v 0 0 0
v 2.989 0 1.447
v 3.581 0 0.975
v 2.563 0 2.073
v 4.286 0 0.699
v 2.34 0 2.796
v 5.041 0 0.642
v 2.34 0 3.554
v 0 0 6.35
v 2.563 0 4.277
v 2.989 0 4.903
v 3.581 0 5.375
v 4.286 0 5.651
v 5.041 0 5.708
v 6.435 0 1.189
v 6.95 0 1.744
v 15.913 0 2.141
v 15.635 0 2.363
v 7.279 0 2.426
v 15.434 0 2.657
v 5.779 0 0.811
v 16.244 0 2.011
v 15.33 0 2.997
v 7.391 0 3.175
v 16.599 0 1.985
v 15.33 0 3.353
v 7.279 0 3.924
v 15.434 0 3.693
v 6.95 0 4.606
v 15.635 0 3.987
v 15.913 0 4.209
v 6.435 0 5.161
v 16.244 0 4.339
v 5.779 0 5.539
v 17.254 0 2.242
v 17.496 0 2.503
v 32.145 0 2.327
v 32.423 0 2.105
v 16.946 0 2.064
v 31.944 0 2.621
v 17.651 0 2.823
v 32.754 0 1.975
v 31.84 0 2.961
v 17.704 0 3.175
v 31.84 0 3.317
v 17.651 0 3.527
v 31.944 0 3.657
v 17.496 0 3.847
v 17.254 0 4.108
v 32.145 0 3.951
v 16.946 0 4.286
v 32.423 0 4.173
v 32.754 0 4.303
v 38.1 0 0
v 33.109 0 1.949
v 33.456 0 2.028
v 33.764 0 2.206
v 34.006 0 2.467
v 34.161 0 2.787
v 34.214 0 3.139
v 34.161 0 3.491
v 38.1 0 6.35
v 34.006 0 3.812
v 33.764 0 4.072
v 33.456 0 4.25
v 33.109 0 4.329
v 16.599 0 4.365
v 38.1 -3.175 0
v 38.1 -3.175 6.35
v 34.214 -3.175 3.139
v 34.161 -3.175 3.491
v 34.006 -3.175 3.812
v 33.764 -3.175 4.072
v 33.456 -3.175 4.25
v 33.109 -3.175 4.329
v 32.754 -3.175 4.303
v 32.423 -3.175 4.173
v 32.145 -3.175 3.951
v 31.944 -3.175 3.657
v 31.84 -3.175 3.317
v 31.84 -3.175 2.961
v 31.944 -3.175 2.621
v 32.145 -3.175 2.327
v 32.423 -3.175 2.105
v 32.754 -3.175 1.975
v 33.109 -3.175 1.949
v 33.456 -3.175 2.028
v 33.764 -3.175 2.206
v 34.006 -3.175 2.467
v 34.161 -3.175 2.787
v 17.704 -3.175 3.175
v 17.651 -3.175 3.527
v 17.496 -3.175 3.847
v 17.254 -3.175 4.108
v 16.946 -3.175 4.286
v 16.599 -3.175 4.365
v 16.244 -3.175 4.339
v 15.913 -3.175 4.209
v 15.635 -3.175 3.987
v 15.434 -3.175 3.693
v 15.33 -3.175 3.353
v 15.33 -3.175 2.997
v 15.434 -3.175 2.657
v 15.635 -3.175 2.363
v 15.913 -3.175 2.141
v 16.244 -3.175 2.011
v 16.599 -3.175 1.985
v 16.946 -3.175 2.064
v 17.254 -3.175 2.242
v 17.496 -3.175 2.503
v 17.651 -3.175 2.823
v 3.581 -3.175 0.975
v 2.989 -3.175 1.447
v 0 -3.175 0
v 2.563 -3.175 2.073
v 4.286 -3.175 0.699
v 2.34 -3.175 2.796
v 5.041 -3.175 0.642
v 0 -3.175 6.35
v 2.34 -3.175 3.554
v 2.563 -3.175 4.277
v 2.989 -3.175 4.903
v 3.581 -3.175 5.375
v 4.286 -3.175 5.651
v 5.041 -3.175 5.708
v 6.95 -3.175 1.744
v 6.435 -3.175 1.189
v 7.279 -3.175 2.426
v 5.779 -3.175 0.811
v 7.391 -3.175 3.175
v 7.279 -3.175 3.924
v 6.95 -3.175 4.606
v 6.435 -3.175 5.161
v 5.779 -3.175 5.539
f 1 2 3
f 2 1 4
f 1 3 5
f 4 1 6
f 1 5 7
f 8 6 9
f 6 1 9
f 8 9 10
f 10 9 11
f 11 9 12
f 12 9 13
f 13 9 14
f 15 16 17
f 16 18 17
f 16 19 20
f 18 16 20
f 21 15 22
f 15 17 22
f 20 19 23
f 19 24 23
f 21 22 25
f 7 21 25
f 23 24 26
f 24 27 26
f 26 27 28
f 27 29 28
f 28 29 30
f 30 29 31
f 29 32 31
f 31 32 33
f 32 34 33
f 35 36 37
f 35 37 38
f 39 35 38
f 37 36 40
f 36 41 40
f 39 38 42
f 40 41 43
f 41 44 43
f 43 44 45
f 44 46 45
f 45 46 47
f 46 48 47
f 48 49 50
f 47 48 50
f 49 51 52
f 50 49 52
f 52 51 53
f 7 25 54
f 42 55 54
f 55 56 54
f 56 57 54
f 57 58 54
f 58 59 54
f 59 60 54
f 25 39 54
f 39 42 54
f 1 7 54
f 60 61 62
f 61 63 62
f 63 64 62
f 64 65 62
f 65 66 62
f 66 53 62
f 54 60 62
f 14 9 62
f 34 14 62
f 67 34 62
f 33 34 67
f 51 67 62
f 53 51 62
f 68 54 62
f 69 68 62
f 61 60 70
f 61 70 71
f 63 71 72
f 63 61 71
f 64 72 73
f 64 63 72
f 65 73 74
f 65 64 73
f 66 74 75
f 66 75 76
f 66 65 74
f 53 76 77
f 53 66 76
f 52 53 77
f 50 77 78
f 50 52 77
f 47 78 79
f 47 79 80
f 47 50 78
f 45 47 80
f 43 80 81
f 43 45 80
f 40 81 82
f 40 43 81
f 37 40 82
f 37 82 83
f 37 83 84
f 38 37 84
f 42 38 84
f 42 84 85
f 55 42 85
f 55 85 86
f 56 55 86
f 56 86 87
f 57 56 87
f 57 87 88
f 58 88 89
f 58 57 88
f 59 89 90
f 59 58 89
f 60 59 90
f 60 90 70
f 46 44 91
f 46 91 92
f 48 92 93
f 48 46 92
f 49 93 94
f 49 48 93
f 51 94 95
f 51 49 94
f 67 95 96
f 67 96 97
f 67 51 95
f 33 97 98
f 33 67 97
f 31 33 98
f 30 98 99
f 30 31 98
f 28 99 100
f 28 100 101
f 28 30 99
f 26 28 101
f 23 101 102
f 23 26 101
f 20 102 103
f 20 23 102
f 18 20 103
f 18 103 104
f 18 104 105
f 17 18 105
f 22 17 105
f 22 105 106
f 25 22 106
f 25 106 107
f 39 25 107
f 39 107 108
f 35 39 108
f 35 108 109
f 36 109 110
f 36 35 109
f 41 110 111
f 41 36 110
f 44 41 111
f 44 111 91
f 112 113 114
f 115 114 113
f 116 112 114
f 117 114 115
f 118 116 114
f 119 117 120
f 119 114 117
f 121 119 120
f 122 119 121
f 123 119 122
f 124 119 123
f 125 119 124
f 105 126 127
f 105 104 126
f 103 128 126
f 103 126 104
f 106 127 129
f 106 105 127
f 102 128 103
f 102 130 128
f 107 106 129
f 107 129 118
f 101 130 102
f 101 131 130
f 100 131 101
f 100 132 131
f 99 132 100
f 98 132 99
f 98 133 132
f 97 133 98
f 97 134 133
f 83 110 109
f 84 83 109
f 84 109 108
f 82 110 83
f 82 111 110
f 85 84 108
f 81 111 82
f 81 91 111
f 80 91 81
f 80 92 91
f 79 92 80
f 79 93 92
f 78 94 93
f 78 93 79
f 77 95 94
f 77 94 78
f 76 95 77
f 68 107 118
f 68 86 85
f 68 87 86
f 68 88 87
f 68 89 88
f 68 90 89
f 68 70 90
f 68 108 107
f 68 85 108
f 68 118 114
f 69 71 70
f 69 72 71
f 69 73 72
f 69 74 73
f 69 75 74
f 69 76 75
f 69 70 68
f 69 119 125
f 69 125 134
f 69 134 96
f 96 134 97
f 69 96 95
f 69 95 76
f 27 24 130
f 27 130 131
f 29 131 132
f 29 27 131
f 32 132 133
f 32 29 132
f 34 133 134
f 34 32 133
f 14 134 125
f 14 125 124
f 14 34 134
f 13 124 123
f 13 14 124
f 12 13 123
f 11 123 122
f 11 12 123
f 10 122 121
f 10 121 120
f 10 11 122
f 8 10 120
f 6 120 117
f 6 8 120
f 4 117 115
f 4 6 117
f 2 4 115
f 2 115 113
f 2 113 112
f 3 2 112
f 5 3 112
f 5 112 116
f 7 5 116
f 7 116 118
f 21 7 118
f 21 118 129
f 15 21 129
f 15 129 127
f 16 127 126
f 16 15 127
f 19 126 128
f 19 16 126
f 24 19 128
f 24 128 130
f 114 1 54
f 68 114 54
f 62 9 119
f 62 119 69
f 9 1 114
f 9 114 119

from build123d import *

# Parameters (mm, degrees)
F0_W     = 38.1
F0_H     = 6.35
F0_R     = 2.54
F0_R_2   = 1.1938
F1_DEPTH = 3.175


with BuildPart() as f1:
    # F0 (on Front) → F1 (new body)
    with BuildSketch(Plane.XZ):
        with Locations((19.05, 3.175)):
            Rectangle(F0_W, F0_H)
        with Locations((4.8514, 3.175)):
            Circle(F0_R, mode=Mode.SUBTRACT)
        with Locations((16.51, 3.175)):
            Circle(F0_R_2, mode=Mode.SUBTRACT)
        with Locations((33.02, 3.139029257)):
            Circle(F0_R_2, mode=Mode.SUBTRACT)
    extrude(amount=F1_DEPTH)


solid = f1.part
